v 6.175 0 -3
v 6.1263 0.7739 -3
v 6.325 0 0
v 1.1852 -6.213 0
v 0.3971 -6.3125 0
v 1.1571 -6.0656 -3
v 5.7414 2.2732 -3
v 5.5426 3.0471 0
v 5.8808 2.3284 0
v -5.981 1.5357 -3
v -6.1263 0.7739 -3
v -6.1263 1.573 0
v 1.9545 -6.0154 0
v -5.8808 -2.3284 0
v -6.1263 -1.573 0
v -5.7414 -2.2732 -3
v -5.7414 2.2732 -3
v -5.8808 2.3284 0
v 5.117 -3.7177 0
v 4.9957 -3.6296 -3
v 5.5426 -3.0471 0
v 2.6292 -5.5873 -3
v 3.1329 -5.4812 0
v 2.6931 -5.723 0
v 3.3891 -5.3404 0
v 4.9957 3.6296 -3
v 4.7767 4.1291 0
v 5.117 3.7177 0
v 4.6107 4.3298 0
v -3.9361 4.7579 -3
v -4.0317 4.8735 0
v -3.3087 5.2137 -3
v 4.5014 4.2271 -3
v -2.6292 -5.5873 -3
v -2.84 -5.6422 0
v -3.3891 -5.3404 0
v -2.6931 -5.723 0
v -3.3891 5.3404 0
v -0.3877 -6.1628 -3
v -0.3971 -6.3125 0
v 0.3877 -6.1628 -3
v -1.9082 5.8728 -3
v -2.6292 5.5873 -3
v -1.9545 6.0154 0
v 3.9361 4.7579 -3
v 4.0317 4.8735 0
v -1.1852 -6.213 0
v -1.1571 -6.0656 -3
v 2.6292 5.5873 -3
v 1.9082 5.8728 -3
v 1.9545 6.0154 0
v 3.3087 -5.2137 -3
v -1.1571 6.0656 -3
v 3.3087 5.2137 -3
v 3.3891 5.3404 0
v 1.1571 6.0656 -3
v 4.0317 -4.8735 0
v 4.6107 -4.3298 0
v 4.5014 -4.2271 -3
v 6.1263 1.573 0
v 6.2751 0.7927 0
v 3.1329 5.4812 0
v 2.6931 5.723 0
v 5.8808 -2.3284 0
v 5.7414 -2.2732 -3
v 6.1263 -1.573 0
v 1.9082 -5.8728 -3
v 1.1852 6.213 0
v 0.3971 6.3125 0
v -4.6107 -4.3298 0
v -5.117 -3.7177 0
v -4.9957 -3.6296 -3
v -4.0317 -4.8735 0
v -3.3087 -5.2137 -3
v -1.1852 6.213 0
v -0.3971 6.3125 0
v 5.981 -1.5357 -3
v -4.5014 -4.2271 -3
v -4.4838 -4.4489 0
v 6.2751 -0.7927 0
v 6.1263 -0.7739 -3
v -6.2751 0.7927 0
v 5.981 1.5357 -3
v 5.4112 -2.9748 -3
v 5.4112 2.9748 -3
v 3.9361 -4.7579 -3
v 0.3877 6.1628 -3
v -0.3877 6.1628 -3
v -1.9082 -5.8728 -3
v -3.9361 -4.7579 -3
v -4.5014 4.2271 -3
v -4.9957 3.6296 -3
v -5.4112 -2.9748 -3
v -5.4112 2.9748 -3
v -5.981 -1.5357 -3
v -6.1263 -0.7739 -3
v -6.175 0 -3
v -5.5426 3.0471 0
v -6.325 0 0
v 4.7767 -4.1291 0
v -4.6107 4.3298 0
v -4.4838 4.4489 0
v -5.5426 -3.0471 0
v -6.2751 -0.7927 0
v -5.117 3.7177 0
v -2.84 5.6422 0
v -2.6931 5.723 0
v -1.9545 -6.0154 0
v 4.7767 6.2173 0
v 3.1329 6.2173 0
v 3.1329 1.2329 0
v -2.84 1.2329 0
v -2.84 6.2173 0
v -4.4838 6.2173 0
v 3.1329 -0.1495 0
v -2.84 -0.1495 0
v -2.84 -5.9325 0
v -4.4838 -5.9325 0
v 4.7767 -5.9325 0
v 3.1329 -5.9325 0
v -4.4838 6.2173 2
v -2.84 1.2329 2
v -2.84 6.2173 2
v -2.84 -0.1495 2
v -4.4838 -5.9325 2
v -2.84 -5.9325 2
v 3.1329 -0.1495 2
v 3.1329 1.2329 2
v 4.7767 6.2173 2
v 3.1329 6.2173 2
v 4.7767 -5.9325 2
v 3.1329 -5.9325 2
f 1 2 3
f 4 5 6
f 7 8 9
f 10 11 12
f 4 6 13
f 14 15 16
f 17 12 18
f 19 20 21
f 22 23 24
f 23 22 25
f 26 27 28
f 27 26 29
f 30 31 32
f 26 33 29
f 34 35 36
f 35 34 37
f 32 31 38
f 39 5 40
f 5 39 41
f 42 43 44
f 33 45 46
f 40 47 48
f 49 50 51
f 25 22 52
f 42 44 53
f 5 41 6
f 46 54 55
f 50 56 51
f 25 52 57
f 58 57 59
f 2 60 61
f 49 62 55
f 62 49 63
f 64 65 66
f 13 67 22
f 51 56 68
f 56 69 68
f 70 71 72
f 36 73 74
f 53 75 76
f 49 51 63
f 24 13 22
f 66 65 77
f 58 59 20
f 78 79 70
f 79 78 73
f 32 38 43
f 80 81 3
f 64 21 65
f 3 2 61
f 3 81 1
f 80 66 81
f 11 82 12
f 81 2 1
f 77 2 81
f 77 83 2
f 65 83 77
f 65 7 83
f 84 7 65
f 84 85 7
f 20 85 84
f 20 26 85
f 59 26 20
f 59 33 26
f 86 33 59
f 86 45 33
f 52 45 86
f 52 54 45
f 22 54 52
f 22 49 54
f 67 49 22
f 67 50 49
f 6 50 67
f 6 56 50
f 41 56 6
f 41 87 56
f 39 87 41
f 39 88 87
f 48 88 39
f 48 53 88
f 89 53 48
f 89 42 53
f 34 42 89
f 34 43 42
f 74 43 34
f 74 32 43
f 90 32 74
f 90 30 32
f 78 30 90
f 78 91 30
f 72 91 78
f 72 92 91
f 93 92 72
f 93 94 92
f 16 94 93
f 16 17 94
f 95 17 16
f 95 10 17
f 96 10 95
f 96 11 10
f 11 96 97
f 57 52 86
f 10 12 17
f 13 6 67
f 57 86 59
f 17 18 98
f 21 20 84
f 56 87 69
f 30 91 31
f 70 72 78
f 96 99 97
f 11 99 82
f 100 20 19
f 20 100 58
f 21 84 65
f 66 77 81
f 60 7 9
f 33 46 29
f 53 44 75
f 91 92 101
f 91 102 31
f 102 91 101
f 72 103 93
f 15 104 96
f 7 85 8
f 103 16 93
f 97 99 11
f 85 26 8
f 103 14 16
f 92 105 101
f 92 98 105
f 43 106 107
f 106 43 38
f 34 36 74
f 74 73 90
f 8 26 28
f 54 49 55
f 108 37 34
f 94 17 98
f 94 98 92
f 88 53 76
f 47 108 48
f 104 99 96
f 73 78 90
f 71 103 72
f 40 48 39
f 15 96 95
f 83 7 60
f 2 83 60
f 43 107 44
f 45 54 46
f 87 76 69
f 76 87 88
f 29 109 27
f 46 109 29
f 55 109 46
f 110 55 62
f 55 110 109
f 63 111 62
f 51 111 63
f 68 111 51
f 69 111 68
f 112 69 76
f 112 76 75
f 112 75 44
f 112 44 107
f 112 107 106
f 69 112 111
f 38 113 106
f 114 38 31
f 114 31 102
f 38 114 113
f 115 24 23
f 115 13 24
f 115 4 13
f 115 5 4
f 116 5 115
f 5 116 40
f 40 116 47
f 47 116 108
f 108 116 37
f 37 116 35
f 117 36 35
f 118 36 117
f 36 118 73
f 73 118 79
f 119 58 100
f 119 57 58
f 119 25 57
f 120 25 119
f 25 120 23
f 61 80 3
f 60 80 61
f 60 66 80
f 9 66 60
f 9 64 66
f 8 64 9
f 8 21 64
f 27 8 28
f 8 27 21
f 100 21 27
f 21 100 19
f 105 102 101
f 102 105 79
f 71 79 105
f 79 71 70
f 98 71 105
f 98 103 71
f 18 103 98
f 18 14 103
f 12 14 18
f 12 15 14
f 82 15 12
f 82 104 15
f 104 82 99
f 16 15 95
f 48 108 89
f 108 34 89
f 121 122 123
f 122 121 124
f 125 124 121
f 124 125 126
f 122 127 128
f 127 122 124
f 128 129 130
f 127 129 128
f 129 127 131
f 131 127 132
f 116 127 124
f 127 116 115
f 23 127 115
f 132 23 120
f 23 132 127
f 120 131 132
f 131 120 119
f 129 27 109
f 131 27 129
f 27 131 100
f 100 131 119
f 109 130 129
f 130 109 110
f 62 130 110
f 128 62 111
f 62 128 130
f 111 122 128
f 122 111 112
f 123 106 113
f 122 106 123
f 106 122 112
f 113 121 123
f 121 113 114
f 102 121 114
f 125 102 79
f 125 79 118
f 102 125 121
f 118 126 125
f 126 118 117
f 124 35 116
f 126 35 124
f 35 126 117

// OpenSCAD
$fn = 50;


difference() {
	union() {
		translate(v = [0, 0, -3.0000000000]) {
			cylinder(h = 3, r1 = 6.1750000000, r2 = 6.3250000000);
		}
		linear_extrude(height = 2) {
			text(font = "Impact", halign = "center", size = 12, text = "H", valign = "center");
		}
	}
	union();
}
